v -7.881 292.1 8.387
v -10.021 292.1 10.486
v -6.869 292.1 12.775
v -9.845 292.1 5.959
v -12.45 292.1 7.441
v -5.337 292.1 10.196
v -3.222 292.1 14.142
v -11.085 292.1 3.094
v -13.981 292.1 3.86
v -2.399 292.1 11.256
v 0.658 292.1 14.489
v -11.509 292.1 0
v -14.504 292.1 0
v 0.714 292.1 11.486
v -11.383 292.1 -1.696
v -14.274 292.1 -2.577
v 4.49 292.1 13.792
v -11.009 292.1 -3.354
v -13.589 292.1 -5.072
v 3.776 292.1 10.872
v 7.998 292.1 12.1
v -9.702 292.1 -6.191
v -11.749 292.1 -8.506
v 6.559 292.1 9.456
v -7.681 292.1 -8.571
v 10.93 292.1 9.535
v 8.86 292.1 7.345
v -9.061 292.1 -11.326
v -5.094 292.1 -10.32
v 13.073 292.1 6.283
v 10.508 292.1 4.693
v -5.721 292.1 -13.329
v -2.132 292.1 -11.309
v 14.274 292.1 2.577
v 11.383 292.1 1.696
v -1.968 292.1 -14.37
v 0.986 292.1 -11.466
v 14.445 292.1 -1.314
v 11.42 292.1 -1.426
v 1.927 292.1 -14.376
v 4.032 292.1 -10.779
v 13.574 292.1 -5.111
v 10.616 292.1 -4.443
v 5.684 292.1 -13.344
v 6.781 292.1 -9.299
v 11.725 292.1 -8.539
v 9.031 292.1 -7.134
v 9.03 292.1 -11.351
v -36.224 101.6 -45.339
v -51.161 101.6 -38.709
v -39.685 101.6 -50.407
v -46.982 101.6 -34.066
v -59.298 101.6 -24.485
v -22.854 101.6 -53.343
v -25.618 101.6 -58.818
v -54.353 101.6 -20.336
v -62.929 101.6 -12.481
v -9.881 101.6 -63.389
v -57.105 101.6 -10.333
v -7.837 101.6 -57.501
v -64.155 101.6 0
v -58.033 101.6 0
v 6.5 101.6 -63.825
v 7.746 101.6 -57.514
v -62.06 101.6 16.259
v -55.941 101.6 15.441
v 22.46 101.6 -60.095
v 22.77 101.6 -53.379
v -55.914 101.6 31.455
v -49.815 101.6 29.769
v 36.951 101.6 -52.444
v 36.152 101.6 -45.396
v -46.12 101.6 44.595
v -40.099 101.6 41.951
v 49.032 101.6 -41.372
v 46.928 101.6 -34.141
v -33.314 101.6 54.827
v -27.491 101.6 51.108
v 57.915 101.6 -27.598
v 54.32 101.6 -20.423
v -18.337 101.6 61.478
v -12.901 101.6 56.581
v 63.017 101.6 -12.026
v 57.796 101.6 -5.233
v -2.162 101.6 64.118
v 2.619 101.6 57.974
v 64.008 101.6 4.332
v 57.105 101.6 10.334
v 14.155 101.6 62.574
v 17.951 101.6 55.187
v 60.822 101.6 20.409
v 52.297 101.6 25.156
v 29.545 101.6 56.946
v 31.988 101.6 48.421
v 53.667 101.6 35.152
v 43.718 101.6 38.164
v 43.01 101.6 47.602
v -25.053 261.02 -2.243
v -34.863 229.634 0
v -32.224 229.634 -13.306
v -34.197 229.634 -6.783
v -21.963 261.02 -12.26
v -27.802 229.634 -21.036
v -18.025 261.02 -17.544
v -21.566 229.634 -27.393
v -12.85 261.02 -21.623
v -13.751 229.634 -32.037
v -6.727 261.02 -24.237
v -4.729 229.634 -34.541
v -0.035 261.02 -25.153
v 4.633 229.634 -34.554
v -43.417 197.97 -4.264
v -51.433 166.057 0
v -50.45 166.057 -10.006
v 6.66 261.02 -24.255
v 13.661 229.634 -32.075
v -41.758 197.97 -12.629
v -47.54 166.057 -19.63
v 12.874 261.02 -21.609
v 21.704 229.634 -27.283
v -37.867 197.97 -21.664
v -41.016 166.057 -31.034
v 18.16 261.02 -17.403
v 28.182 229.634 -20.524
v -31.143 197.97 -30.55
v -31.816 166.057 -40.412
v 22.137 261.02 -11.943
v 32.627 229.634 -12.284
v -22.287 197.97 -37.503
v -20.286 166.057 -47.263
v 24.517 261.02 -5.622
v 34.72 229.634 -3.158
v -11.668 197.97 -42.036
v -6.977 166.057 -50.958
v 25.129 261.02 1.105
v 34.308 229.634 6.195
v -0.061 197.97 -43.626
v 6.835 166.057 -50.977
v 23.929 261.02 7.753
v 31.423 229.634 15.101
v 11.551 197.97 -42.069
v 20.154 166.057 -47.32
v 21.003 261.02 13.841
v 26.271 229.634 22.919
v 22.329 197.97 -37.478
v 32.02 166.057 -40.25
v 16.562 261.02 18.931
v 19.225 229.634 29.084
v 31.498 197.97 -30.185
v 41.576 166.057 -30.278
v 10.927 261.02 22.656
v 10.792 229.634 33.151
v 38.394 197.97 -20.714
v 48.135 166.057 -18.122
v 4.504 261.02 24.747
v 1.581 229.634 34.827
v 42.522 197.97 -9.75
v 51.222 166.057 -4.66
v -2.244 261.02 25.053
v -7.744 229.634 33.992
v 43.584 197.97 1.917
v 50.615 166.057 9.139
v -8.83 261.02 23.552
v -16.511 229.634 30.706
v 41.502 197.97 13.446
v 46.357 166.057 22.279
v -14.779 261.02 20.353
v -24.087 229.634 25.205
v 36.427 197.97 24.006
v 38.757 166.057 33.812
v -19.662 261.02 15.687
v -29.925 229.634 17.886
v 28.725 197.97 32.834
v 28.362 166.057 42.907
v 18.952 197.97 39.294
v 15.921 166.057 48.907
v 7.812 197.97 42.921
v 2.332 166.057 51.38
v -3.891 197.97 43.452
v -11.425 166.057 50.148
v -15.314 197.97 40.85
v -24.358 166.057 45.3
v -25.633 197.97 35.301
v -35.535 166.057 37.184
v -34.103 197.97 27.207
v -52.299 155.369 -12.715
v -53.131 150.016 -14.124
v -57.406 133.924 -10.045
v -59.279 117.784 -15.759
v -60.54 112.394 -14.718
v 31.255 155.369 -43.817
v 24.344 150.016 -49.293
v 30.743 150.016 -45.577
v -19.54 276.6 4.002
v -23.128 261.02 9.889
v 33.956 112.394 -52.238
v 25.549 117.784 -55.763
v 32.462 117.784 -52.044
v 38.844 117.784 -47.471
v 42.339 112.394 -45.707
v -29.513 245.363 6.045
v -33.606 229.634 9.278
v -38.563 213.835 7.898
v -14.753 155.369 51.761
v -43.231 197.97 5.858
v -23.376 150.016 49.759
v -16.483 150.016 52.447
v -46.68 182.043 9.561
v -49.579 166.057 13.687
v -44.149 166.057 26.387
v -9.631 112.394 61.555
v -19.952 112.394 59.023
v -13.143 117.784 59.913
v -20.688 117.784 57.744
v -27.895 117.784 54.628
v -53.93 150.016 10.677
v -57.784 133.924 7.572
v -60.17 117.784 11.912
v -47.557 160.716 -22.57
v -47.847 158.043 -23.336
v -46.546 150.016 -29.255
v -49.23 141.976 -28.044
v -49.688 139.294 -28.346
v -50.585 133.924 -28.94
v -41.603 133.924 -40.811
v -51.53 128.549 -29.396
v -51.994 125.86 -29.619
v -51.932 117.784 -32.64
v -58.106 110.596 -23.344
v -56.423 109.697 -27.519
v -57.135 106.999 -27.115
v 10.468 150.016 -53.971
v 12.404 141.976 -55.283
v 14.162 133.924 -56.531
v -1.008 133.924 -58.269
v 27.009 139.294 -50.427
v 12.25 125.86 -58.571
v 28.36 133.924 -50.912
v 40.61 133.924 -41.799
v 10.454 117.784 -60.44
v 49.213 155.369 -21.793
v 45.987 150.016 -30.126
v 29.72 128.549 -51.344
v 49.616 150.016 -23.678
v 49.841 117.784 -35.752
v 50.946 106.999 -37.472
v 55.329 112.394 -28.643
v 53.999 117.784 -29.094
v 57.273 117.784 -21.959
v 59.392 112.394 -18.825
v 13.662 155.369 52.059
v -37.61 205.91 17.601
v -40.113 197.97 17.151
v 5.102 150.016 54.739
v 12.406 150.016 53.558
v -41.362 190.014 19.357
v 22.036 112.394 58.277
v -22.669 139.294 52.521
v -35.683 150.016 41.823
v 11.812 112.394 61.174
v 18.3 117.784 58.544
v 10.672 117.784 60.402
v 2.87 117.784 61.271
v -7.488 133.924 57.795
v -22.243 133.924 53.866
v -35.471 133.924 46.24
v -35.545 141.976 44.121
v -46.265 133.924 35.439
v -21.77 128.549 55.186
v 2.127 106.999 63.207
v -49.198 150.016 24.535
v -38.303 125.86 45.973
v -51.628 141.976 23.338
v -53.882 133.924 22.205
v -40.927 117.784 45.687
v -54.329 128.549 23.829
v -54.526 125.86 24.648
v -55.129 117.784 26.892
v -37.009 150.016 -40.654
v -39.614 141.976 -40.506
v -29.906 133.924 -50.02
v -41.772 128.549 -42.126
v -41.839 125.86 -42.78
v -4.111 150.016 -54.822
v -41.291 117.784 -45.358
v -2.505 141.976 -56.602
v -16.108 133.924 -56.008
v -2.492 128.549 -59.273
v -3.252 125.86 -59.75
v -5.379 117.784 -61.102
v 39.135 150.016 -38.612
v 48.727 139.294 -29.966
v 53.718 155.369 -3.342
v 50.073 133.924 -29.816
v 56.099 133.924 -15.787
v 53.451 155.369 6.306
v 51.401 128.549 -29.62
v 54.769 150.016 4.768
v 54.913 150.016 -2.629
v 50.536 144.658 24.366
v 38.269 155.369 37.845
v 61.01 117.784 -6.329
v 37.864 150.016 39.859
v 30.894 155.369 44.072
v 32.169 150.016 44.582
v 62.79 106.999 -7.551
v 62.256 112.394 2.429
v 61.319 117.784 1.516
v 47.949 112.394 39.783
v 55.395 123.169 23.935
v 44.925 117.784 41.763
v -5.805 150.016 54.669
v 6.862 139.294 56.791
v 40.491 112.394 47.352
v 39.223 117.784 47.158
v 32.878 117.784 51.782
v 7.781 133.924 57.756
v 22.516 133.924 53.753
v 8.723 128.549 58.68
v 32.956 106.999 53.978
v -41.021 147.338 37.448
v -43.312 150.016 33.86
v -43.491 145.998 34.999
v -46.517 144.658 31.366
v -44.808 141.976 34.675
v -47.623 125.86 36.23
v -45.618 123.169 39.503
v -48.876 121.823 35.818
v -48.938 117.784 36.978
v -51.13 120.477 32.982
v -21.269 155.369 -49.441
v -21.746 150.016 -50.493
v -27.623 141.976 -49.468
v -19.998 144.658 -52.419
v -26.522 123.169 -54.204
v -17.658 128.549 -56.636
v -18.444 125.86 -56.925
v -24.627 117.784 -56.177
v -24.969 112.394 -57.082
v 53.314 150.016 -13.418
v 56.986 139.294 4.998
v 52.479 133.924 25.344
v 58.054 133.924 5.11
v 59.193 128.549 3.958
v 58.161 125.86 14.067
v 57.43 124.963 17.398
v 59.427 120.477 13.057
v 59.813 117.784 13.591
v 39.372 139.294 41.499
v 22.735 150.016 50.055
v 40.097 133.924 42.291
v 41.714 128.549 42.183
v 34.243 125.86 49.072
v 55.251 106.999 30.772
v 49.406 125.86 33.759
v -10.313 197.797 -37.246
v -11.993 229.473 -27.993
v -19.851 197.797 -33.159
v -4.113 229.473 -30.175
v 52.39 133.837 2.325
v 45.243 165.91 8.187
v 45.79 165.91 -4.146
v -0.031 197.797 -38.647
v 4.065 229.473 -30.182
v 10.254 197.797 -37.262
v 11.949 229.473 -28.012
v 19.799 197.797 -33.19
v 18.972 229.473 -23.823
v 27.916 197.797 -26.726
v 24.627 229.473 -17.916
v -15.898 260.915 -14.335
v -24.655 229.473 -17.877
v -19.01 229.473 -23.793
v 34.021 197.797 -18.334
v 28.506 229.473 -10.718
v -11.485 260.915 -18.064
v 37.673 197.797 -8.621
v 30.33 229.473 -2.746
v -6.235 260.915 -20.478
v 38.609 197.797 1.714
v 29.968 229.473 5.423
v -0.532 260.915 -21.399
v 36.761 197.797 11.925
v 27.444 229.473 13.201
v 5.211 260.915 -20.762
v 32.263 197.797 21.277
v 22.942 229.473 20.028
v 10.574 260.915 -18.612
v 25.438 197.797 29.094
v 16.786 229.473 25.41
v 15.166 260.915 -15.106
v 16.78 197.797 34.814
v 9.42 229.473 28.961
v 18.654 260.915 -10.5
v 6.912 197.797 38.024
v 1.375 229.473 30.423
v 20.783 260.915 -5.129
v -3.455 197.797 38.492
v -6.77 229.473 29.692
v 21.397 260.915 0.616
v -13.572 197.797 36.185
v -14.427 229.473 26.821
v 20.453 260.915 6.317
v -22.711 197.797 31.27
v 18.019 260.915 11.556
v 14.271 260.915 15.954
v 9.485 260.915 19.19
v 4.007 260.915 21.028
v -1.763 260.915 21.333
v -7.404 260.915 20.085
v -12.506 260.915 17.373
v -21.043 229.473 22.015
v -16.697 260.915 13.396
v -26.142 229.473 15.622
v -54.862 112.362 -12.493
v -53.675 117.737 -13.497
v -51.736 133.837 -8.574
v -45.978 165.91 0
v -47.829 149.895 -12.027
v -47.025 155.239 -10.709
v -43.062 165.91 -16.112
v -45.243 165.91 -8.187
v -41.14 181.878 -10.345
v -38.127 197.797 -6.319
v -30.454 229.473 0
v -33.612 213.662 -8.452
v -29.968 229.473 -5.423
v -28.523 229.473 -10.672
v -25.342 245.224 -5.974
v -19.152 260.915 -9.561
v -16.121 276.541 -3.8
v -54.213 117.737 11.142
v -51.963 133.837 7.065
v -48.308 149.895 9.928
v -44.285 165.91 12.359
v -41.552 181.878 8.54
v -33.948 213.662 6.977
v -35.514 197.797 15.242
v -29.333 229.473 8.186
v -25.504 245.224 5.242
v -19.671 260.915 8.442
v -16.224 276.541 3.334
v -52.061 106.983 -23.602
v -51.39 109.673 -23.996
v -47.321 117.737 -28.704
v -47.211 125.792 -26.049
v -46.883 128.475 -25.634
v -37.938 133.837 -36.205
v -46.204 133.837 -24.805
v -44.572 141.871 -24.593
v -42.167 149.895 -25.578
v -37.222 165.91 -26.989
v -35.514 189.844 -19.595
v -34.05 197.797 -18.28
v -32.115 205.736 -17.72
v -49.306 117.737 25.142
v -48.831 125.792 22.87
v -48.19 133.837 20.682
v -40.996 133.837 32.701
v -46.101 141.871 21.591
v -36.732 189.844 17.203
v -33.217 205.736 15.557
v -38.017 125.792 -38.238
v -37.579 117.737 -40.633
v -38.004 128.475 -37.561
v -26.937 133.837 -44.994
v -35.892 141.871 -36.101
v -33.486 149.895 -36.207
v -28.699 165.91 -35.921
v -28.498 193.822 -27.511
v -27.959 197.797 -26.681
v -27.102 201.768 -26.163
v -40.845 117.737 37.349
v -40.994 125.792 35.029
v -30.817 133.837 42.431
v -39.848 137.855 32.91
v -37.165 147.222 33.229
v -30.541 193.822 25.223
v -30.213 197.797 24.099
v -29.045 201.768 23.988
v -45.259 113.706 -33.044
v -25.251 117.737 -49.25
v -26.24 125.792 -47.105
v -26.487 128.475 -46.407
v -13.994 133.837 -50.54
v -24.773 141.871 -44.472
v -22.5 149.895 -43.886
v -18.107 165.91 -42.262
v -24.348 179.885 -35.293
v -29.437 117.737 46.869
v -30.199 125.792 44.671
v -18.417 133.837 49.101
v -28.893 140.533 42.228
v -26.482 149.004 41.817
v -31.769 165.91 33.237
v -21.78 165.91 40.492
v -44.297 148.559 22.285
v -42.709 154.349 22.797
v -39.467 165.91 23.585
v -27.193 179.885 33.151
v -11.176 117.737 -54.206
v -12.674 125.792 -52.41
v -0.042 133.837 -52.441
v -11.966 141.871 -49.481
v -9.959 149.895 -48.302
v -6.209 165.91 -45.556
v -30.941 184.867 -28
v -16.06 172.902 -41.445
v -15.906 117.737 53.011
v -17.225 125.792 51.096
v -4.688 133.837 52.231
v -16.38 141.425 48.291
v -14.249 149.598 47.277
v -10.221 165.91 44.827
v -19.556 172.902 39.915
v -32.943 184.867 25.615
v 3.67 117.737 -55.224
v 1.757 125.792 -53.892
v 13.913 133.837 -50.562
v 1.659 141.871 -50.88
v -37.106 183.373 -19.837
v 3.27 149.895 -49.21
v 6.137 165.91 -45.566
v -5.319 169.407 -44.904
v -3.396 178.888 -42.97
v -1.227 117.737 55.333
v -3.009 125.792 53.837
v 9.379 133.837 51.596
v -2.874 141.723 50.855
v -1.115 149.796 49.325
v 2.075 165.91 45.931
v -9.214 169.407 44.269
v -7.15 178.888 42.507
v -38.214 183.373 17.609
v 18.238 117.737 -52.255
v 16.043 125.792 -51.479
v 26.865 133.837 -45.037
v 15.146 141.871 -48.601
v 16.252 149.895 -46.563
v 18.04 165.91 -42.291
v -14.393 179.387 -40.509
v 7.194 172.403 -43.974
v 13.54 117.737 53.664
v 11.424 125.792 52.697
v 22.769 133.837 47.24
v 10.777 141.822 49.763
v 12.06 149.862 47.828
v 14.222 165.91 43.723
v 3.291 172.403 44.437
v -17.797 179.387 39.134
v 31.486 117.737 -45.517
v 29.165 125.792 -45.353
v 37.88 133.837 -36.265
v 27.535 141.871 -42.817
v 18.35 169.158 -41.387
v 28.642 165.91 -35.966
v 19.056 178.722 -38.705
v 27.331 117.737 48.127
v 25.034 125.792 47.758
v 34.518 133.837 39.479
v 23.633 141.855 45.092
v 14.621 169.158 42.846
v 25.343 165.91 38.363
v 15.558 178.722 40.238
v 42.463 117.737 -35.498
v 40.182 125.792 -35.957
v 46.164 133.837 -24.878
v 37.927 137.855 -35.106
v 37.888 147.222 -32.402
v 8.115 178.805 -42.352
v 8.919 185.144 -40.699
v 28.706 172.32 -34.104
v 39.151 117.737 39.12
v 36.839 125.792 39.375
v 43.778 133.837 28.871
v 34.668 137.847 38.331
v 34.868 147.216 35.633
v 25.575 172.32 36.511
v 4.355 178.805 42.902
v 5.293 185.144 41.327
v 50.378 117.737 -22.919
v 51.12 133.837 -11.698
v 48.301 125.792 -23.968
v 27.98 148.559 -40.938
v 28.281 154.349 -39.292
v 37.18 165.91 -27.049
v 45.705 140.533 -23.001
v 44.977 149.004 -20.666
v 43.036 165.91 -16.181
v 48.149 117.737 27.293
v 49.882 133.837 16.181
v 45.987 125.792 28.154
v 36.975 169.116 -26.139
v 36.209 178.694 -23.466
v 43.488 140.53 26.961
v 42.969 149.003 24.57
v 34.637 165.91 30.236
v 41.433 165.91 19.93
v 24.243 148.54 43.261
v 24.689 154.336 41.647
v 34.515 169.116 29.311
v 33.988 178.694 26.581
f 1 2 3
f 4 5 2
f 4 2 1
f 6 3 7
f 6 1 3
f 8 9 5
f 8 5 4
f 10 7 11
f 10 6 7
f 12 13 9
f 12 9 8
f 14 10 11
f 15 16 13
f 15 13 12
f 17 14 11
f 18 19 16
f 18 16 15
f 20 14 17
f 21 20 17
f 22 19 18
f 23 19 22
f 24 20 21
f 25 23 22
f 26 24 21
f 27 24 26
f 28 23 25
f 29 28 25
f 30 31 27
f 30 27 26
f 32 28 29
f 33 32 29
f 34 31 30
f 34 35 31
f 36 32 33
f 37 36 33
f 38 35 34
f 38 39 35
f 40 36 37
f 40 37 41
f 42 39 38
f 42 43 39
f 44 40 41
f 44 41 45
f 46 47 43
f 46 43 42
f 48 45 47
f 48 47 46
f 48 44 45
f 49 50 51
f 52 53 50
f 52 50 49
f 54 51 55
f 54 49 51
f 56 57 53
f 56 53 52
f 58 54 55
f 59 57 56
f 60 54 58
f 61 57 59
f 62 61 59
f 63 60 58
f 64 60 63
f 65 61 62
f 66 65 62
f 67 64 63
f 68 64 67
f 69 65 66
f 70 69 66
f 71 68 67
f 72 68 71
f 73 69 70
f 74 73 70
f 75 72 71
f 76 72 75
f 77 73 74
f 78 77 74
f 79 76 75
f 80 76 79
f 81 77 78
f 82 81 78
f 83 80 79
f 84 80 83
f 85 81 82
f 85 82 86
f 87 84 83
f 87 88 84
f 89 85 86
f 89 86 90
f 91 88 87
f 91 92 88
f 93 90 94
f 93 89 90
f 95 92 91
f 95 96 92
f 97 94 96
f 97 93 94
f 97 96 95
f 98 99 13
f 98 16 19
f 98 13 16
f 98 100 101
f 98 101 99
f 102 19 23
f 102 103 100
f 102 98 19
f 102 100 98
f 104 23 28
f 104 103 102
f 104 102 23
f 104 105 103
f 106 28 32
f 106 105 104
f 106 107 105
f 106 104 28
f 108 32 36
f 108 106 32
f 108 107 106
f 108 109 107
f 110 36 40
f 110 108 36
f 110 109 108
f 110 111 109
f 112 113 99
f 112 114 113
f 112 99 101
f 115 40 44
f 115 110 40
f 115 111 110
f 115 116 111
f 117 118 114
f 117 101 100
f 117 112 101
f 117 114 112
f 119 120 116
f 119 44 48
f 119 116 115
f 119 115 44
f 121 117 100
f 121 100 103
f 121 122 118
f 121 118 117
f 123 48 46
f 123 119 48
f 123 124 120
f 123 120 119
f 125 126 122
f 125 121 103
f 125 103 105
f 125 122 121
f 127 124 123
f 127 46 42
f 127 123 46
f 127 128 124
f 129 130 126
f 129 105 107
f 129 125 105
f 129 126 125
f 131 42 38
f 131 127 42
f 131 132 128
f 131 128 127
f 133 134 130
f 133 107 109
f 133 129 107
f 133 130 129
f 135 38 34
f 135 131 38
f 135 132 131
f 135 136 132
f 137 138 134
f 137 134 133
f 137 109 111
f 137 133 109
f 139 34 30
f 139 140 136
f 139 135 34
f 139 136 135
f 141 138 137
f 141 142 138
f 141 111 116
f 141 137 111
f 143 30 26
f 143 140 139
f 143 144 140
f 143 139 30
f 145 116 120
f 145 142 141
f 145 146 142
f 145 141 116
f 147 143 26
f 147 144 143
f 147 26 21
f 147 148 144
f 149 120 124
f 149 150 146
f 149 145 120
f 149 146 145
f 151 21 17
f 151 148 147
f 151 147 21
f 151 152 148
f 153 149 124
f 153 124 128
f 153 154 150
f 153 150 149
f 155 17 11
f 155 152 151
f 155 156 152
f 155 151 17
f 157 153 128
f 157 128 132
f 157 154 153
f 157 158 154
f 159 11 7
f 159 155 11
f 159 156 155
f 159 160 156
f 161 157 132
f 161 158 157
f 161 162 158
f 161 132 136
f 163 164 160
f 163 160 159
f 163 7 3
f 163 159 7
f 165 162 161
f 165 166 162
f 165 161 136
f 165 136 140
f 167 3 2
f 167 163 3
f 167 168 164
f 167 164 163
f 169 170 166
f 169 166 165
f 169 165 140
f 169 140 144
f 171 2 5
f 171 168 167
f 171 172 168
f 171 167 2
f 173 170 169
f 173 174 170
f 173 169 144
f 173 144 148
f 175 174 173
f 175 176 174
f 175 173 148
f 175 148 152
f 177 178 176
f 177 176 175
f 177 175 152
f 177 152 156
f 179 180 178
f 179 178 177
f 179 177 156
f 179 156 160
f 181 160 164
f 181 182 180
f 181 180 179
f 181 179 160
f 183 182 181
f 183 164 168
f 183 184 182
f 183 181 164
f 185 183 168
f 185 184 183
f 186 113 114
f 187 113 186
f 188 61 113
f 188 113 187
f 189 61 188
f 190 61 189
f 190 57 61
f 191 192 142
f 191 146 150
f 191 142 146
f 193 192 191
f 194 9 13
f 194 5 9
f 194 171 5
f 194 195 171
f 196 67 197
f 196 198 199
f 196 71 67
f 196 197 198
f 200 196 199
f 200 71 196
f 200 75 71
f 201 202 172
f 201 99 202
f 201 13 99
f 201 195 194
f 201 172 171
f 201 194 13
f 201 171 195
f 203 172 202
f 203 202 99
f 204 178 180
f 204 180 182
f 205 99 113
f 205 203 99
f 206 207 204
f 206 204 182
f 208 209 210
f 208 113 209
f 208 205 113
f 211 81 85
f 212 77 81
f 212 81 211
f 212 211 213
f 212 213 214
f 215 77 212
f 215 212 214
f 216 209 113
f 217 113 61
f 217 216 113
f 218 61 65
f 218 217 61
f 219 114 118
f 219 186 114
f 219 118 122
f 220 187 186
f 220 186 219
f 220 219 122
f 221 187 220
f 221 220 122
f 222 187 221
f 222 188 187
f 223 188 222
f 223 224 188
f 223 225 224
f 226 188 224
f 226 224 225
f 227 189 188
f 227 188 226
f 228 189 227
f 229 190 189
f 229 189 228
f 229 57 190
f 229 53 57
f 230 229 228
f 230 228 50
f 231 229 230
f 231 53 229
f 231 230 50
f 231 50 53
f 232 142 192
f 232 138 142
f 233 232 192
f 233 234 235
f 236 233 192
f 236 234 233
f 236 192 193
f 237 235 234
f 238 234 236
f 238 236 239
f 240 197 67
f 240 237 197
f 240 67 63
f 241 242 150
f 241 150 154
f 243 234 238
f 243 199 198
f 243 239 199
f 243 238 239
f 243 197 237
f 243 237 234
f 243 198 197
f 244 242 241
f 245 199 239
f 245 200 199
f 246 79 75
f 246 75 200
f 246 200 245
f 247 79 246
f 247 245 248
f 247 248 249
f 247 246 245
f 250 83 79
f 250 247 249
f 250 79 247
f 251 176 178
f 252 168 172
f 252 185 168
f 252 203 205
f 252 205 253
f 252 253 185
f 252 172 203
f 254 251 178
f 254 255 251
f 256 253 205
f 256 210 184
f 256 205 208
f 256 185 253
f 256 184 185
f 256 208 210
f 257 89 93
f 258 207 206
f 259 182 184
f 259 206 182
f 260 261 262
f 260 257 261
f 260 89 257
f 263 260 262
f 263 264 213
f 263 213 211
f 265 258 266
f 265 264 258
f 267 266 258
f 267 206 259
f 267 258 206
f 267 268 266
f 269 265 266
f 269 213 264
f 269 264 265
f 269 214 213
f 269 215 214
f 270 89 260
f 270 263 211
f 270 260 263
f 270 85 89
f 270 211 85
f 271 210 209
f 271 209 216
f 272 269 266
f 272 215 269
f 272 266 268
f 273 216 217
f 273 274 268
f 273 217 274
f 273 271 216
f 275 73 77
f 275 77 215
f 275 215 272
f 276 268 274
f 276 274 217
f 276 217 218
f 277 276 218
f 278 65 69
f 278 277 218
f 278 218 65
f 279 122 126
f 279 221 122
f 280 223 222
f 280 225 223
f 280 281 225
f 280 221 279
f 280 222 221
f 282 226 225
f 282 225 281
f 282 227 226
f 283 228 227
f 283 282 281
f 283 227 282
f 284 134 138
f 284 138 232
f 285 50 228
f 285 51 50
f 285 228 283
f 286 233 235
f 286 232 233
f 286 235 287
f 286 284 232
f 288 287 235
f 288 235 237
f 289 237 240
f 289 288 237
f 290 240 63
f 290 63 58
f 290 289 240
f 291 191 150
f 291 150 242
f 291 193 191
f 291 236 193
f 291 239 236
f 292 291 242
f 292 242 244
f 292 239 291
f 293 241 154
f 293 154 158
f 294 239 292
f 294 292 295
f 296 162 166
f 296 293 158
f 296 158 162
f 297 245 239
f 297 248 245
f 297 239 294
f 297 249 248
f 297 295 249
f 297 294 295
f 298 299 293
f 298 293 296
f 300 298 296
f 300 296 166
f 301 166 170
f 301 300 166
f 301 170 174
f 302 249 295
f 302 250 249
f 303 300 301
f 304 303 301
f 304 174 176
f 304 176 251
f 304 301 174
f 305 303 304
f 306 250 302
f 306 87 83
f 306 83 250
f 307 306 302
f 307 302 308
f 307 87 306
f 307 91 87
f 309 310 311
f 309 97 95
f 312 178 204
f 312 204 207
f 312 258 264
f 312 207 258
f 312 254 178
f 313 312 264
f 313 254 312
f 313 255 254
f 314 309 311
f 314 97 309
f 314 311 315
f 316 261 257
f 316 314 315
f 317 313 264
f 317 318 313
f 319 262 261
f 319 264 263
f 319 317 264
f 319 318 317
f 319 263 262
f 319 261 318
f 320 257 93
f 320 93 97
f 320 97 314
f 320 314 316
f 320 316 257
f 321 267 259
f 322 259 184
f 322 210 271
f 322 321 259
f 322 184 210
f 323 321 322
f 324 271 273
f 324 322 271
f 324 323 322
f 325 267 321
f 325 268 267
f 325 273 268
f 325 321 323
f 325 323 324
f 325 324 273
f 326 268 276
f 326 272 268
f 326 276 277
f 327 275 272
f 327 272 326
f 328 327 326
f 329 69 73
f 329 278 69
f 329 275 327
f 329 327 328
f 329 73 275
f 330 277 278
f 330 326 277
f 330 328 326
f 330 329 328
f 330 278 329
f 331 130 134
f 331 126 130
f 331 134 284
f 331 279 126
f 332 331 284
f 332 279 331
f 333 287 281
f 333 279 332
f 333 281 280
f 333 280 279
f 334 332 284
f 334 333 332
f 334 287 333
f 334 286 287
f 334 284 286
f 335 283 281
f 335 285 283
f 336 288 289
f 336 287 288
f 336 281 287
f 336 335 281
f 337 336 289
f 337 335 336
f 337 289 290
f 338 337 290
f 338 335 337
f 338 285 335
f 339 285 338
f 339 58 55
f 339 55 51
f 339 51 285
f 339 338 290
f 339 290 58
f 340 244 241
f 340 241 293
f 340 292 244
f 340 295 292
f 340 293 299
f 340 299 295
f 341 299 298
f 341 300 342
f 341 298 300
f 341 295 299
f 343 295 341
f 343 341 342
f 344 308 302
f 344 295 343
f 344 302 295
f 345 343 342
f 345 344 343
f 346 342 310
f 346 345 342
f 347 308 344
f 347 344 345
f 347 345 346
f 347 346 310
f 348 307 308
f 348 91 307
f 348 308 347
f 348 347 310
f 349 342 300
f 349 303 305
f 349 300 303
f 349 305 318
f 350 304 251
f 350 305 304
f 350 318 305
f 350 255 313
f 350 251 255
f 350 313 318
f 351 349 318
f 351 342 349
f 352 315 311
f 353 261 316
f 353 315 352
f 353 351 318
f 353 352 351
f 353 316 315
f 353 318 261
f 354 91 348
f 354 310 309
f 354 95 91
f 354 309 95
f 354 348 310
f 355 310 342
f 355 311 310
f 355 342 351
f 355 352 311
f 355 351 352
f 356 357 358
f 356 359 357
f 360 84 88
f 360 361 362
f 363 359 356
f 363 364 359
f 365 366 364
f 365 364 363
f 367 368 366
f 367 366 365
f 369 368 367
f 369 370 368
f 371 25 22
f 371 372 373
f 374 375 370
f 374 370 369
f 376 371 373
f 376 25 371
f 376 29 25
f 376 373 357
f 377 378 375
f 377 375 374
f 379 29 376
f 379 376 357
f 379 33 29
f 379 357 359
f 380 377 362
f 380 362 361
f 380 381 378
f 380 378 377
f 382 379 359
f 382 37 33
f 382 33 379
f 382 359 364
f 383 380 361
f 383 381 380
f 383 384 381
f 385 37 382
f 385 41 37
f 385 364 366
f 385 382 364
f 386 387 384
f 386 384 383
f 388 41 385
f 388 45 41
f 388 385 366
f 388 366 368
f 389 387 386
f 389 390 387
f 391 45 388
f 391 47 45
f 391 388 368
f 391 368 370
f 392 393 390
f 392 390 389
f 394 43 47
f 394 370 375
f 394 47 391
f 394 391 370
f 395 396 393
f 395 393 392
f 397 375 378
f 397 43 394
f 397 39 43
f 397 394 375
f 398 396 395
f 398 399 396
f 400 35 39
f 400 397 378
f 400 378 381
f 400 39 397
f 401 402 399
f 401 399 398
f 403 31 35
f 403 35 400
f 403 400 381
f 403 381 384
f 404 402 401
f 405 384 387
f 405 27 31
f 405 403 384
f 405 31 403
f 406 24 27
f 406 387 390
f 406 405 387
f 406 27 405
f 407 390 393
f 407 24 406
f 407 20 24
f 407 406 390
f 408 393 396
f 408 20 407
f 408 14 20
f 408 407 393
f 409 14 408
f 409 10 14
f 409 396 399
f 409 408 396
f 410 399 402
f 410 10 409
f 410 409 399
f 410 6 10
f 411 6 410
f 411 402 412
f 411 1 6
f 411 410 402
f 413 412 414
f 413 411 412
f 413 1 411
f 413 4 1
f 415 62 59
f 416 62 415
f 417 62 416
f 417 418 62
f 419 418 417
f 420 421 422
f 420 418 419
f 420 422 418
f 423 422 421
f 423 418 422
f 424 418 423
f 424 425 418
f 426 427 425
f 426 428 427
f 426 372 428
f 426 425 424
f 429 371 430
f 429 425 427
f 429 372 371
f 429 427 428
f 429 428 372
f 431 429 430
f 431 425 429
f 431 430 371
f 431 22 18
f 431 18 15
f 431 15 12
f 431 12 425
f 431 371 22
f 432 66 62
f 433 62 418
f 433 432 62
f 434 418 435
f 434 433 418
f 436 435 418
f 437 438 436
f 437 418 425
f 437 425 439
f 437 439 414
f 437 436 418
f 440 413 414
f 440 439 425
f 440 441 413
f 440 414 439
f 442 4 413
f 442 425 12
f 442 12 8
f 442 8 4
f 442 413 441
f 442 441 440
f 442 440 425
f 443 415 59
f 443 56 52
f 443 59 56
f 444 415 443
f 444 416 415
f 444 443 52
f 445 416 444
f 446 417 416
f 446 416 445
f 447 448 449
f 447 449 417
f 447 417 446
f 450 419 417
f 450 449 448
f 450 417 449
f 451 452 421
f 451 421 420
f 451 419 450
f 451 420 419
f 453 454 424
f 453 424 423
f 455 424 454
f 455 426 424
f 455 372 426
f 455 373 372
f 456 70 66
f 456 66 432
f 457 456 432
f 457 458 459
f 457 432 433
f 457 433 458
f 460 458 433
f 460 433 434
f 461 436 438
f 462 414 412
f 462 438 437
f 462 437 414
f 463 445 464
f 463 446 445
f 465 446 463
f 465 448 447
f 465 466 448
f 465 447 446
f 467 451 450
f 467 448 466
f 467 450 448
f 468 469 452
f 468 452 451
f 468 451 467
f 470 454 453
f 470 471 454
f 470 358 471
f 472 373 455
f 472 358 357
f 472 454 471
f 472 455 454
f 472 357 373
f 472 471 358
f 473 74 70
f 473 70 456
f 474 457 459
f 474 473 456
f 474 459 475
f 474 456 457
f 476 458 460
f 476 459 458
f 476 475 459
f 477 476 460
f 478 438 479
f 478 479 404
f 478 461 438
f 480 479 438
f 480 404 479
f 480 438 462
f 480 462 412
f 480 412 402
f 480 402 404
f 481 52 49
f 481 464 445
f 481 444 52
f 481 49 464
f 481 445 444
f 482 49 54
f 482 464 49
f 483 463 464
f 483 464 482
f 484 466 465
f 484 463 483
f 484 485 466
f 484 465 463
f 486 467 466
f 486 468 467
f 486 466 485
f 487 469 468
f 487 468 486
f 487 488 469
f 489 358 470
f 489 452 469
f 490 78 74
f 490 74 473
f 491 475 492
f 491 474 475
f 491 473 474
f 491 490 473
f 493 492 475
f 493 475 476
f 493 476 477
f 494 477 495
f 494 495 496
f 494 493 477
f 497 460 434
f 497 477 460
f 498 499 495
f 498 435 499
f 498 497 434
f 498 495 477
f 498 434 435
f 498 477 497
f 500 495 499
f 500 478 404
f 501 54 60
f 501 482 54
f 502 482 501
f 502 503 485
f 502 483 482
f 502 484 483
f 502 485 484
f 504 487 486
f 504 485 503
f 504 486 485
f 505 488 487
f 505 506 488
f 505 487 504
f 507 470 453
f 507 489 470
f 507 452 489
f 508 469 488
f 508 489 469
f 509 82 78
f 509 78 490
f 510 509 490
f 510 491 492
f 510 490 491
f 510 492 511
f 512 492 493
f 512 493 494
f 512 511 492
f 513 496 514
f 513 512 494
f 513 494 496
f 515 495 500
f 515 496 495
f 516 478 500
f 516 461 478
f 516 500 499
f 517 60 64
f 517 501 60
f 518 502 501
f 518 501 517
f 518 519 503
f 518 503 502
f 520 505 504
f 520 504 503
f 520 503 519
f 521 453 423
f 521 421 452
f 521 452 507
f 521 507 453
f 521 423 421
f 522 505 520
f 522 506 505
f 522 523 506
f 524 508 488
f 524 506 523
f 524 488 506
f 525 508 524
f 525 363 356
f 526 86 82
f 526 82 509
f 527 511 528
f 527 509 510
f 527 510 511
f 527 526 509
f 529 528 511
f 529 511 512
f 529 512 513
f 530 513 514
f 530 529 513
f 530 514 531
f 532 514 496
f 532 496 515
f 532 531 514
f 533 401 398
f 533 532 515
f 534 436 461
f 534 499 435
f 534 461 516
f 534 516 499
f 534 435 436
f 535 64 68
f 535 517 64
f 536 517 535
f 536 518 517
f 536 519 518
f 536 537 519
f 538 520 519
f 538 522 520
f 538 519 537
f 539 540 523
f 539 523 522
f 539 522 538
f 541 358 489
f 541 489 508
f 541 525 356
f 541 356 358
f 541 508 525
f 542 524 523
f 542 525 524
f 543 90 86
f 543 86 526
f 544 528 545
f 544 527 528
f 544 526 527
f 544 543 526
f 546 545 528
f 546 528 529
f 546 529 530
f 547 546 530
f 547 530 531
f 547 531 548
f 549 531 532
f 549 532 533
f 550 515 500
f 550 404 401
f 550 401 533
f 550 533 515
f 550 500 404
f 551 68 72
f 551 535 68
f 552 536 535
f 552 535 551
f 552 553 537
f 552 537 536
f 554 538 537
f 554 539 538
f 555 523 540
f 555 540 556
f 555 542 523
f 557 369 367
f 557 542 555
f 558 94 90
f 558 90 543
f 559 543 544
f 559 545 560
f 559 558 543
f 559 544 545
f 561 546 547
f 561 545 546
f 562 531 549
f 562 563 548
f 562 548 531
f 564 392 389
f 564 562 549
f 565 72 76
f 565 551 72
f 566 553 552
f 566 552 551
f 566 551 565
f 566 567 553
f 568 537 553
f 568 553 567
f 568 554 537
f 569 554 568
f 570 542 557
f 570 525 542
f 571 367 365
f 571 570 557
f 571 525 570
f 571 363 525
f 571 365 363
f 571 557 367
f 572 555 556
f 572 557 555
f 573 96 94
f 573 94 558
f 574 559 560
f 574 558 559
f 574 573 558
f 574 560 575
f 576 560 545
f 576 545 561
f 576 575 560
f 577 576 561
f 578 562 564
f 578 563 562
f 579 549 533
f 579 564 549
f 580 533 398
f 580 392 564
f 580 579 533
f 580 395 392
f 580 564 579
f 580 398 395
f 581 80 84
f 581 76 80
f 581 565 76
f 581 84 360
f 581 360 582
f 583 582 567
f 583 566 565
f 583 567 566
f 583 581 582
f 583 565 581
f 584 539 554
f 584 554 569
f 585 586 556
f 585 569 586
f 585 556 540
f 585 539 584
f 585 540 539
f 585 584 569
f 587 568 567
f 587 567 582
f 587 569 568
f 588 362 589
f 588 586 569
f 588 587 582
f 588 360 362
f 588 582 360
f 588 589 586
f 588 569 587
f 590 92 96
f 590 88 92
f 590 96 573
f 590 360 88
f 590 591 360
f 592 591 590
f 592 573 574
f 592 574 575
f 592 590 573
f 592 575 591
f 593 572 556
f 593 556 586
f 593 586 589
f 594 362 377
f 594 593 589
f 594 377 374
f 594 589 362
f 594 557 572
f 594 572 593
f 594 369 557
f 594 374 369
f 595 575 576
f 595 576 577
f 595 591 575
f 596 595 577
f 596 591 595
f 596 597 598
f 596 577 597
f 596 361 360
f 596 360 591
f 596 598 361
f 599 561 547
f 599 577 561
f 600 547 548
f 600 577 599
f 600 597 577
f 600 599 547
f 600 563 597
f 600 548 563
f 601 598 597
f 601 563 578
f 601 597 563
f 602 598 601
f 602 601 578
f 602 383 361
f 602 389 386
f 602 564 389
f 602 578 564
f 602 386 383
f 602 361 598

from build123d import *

# Parameters (mm, degrees)
SKETCH7_R           = 317.5
CUT_EXTRUDE2_DEPTH  = 88.9
SKETCH8_R           = 73.025
SKETCH8_R_2         = 69.85
BOSS_EXTRUDE1_DEPTH = 76.2
SKETCH9_R           = 87.299275162
CUT_EXTRUDE3_DEPTH  = 177.8


with BuildPart() as part:
    # Sketch2 → Revolve1 (revolve)
    with BuildSketch(Plane.XY):
        with BuildLine():
            Line((-76.2, 0), (-69.85, 0))
            ThreePointArc((-69.85, 0), (-46.178344337, 164.977710697), (0, 325.12))
            Line((0, 325.12), (0, 330.2))
            ThreePointArc((0, 330.2), (-50.970594074, 168.070137094), (-76.2, 0))
        make_face()
    revolve(axis=Axis((0, 330.2, 0), (0, -1, 0)))

    # Sketch7 → Cut-Extrude2 (cut)
    with BuildSketch(Plane(origin=(0, 381, 0), x_dir=(1, 0, 0), z_dir=(0, 1, 0))):
        Circle(SKETCH7_R)
    extrude(amount=-CUT_EXTRUDE2_DEPTH, mode=Mode.SUBTRACT)

    # Sketch8 → Boss-Extrude1 (add)
    with BuildSketch(Plane.XZ):
        Circle(SKETCH8_R)
        Circle(SKETCH8_R_2, mode=Mode.SUBTRACT)
    extrude(amount=BOSS_EXTRUDE1_DEPTH)

    # Sketch9 → Cut-Extrude3 (cut)
    with BuildSketch(Plane.XZ.offset(76.2)):
        Circle(SKETCH9_R)
    extrude(amount=-CUT_EXTRUDE3_DEPTH, mode=Mode.SUBTRACT)


solid = part.part
